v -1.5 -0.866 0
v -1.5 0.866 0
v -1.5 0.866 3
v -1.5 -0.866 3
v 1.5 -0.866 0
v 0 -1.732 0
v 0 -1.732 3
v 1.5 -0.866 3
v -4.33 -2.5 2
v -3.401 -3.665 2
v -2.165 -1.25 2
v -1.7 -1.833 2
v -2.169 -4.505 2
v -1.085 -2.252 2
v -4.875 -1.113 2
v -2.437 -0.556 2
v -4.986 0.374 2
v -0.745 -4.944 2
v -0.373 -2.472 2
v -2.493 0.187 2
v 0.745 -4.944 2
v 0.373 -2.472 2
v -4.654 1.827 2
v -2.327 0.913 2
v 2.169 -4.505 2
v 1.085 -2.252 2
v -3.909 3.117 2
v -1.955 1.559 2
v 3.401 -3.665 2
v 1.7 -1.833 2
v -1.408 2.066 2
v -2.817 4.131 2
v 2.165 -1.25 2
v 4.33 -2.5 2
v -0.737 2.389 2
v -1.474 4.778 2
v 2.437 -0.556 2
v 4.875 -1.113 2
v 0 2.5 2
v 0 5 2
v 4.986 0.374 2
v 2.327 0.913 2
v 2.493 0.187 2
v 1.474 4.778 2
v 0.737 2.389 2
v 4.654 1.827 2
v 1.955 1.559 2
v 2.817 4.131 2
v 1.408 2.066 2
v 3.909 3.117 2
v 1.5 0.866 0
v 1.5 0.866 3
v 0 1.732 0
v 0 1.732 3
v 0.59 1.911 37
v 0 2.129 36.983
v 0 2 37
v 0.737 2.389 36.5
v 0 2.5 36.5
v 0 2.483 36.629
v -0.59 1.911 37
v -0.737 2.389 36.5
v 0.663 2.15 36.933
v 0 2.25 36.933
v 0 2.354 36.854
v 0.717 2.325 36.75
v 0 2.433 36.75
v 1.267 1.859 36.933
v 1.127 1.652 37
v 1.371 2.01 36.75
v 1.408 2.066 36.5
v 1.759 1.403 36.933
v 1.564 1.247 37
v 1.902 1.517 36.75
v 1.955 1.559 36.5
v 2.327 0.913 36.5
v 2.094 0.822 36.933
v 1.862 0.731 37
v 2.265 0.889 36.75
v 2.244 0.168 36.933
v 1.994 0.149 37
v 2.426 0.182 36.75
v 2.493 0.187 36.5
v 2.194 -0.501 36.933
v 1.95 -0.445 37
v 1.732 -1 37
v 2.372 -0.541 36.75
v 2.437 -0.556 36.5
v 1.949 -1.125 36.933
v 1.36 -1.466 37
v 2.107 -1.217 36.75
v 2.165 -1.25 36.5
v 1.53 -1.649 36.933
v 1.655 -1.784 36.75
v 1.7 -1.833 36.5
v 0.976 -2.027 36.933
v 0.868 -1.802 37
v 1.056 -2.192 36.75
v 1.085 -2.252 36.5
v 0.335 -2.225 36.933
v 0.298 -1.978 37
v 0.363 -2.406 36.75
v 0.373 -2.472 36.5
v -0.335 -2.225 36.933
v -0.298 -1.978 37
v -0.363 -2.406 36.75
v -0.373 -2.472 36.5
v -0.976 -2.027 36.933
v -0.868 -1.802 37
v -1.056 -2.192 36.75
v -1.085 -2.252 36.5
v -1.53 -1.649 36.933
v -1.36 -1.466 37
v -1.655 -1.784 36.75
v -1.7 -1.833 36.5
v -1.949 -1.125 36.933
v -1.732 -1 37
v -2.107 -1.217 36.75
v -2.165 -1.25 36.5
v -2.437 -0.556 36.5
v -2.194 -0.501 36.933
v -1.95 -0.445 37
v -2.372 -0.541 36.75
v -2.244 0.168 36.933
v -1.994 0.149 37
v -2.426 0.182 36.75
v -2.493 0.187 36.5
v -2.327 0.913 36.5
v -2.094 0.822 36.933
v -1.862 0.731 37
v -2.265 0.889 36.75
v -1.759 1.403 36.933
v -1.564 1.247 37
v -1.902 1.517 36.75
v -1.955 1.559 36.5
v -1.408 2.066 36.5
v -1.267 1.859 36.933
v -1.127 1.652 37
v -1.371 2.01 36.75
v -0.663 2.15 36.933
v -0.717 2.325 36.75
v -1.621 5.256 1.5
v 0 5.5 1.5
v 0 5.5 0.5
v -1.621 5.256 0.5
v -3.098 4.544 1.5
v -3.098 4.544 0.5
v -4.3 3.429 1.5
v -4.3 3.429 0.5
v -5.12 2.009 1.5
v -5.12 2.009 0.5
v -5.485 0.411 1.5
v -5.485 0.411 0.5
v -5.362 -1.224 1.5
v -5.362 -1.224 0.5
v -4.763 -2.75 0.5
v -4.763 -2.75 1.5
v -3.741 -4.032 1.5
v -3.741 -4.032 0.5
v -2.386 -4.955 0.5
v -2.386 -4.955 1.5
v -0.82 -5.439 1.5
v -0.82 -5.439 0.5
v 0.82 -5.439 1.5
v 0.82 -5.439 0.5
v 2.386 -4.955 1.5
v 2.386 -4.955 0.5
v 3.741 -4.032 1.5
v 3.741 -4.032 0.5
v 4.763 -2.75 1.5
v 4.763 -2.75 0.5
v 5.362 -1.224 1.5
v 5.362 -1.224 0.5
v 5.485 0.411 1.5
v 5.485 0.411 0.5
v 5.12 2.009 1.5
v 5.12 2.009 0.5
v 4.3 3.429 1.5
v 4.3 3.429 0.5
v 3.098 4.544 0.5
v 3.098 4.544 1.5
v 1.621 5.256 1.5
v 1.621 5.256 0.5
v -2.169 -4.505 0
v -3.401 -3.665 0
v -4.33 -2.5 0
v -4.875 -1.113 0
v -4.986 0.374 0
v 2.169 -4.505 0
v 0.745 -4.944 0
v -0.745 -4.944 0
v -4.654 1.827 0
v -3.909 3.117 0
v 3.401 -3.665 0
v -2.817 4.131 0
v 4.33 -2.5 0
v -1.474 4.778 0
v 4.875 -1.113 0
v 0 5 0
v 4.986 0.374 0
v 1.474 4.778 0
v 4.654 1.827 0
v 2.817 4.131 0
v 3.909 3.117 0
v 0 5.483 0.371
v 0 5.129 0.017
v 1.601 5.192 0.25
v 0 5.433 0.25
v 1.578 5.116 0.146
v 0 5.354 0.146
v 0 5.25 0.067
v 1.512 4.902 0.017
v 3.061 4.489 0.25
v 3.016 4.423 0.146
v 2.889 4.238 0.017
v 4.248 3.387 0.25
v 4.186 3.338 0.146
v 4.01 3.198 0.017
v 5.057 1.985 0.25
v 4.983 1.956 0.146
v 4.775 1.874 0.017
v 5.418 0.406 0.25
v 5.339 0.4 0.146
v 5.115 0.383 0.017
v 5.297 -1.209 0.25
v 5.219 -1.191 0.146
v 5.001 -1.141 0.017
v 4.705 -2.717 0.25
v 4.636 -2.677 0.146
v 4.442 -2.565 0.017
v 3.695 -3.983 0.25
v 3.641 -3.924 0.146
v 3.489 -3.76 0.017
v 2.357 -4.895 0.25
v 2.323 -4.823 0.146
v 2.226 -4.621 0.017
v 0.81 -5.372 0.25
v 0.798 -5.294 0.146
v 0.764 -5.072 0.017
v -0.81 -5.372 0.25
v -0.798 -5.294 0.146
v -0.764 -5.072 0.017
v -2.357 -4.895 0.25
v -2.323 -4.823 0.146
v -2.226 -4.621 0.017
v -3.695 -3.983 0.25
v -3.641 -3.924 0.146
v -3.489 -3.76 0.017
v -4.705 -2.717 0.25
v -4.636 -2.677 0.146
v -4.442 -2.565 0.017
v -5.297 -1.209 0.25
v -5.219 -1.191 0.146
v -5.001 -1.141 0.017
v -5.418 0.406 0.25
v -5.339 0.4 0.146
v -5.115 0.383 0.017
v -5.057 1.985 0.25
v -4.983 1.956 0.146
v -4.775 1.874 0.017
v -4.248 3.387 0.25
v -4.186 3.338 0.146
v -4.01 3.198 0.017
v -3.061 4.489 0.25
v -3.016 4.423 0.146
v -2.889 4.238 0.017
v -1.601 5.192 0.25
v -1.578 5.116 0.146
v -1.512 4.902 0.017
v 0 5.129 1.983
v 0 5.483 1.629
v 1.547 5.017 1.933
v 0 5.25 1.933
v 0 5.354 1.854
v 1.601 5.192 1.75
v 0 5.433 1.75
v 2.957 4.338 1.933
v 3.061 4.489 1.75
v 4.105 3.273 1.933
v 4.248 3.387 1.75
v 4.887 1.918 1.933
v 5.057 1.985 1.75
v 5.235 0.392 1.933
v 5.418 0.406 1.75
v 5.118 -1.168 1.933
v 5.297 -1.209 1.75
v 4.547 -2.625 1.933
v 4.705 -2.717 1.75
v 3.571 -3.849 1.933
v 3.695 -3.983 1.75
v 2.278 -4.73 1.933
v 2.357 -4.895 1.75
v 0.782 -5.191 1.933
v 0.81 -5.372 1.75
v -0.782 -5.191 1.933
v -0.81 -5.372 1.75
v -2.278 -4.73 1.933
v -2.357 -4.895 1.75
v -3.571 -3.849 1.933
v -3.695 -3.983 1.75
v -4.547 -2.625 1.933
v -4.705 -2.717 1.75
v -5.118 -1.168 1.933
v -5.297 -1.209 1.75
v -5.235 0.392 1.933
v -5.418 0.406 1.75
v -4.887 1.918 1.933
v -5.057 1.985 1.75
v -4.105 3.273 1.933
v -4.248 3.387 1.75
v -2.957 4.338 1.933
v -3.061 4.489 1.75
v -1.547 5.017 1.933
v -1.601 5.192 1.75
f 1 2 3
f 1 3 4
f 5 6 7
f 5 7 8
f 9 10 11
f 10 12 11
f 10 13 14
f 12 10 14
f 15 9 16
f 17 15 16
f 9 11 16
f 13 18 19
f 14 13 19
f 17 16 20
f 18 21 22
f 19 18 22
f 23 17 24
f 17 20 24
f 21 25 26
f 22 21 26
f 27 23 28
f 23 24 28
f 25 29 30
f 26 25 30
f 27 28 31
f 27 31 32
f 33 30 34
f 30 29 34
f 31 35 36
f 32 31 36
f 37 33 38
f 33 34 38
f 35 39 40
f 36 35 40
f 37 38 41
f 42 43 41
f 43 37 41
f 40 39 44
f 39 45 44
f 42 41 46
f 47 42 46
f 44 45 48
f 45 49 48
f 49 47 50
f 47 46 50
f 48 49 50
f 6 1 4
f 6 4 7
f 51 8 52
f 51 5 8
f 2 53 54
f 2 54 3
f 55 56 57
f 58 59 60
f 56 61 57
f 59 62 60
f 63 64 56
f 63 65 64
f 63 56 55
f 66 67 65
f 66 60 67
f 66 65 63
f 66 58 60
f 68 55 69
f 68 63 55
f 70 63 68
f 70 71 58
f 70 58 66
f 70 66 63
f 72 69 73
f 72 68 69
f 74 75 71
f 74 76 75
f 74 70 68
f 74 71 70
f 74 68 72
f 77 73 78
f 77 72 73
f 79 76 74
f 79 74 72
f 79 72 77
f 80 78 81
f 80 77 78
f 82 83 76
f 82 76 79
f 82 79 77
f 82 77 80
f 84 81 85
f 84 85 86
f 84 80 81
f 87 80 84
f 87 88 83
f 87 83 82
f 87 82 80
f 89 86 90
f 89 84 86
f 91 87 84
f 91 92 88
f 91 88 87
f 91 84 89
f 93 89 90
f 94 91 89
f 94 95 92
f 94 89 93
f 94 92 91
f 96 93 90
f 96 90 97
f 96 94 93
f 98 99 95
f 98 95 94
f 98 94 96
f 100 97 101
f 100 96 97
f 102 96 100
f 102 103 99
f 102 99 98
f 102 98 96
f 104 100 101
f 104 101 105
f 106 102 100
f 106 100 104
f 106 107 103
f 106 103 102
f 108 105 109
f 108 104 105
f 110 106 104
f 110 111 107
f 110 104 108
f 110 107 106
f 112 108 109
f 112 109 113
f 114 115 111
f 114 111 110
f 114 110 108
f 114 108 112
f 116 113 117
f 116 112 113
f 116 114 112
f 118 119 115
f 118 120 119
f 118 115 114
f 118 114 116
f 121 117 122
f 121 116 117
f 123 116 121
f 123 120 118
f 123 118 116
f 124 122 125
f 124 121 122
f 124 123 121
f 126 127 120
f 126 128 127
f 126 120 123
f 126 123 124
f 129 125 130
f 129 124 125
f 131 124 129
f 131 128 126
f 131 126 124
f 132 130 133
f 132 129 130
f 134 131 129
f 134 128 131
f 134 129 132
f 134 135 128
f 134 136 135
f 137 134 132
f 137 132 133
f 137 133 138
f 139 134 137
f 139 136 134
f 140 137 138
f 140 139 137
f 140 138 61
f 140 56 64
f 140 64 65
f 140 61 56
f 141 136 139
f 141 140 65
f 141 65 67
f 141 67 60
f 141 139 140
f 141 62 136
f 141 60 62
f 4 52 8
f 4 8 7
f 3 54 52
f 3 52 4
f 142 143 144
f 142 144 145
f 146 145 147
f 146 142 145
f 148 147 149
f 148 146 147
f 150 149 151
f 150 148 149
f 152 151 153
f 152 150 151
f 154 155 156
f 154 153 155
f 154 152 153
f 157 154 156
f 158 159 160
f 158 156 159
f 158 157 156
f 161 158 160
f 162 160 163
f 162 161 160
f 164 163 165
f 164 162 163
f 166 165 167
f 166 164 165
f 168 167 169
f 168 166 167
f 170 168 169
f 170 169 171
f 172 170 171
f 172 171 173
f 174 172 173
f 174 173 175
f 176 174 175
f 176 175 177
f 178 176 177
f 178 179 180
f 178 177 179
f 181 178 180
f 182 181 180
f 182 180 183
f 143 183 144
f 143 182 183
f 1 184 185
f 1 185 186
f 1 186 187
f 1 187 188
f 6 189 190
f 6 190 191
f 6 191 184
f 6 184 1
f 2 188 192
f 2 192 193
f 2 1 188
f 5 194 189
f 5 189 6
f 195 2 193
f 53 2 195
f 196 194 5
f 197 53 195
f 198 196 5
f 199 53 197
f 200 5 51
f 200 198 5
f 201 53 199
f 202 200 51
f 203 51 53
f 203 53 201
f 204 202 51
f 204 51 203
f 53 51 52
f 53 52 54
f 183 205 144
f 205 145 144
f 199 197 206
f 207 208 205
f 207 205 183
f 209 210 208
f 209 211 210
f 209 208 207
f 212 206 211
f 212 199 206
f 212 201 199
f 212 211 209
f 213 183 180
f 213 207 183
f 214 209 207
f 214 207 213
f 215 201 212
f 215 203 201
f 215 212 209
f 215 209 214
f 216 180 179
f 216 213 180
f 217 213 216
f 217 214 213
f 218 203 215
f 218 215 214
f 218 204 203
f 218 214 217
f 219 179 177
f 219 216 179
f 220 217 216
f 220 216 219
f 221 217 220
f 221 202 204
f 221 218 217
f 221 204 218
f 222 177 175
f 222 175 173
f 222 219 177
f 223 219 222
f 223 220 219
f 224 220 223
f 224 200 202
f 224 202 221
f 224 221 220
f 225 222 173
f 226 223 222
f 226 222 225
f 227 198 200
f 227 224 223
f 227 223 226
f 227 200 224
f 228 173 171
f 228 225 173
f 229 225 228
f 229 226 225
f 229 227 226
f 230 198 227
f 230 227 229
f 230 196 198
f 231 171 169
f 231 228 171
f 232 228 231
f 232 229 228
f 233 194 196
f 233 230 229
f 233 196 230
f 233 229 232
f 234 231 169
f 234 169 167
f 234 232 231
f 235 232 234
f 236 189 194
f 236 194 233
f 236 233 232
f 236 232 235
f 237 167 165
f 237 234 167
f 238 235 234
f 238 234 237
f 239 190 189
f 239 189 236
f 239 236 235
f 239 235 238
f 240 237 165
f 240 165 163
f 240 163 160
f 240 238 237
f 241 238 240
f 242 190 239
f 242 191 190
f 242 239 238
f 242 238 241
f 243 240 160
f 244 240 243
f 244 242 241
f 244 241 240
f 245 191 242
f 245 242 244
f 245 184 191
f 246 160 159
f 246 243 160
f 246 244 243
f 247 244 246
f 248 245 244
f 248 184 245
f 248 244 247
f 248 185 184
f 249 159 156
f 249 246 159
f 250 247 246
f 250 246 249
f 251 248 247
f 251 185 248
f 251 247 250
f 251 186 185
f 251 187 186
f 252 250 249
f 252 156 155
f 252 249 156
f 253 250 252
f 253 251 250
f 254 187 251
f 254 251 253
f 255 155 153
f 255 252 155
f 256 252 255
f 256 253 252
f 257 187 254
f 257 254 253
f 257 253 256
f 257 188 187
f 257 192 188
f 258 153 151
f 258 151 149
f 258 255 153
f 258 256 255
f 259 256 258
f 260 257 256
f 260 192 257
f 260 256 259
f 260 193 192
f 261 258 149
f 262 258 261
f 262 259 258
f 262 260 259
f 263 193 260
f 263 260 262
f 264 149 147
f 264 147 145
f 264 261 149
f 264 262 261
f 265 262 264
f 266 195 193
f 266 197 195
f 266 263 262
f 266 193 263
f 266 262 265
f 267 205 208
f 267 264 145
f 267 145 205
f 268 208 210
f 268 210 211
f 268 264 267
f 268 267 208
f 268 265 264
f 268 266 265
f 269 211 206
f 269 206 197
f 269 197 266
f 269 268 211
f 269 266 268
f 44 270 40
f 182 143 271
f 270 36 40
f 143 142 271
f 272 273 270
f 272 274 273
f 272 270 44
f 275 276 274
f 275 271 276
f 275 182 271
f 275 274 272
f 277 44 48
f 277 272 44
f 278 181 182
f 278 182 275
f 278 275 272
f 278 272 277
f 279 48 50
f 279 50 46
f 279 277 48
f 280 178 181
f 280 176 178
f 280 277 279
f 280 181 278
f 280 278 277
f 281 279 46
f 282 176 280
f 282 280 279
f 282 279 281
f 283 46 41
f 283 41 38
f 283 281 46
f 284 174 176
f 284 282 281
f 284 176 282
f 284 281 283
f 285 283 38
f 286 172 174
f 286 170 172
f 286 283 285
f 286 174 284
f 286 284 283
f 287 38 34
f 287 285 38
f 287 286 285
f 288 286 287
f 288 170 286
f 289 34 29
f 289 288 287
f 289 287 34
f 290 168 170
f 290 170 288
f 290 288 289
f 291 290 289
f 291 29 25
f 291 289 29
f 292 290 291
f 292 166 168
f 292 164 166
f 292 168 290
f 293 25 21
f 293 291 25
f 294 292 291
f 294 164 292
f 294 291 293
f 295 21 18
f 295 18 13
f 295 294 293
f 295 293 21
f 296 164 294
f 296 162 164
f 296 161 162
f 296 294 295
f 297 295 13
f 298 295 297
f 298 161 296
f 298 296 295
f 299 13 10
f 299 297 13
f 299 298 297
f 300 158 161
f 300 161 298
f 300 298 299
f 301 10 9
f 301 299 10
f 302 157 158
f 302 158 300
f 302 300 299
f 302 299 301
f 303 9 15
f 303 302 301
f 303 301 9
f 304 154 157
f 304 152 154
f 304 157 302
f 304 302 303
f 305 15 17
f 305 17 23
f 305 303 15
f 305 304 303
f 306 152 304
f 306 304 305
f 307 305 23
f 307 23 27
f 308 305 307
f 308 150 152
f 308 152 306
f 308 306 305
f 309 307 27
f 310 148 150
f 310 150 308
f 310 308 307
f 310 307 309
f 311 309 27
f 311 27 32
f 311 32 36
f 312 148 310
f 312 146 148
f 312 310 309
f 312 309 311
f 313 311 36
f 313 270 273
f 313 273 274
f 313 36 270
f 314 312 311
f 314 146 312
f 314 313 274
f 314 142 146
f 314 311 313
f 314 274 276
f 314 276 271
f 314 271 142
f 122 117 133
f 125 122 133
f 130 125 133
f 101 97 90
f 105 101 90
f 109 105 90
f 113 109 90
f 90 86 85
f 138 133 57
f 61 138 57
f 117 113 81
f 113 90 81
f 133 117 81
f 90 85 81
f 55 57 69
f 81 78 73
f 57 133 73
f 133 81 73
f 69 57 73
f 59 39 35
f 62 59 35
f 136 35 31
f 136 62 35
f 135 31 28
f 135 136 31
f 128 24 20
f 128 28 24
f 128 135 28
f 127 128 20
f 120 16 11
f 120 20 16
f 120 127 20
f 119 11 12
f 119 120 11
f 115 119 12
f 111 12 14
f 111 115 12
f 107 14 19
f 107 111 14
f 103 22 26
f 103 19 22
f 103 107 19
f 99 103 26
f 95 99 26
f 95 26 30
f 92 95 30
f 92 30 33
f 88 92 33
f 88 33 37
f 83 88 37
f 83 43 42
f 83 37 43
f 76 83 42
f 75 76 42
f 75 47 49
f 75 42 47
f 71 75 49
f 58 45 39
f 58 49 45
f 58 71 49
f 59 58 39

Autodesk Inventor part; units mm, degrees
ref_plane "YZ Plane" through (0, 0, 0) normal (1, 0, 0) x (0, 1, 0)
ref_plane "XZ Plane" through (0, 0, 0) normal (0, 1, 0) x (-1, 0, 0)
ref_plane "XY Plane" through (0, 0, 0) normal (0, 0, 1) x (1, 0, 0)
sketch "Sketch1" plane through (0, 0, 0) normal (1, 0, 0) x (0, 1, 0)
  line L0 (0, 0) -> (5.5, 0)
  line L1 (5.5, 0) -> (5.5, 2)
  line L2 (5.5, 2) -> (2.5, 2)
  line L3 (2.5, 2) -> (2.5, 37)
  line L4 (2.5, 37) -> (0, 37)
  line L5 (0, 37) -> (0, 0)
  dimension "d0" = 35
  dimension "d1" = 2
  dimension "d2" = 5.5
  dimension "d3" = 2.5
revolve "Revolution1" add sketch "Sketch1" angle 360 about axis through (0, 0, 37) along (0, 0, -1)
fillet "Fillet1" radius 0.5 3 edges at (0, -5.5, 0) (0, -5.5, 2) (0, -2.5, 37)
sketch "Sketch2" plane through (0, 0, 0) normal (0, 0, -1) x (-1, 0, 0)
  circle A0 centre (0, 0) radius 5 projected
  line L0 (1.5, -0.866) -> (0, -1.7321)
  line L1 (0, -1.7321) -> (-1.5, -0.866)
  line L2 (-1.5, -0.866) -> (-1.5, 0.866)
  line L3 (-1.5, 0.866) -> (0, 1.7321)
  line L4 (0, 1.7321) -> (1.5, 0.866)
  line L5 (1.5, 0.866) -> (1.5, -0.866)
  dimension "d6" = 3
extrude "Extrusion1" cut sketch "Sketch2" against normal blind 3 contours L0 L1 L2 L3 L4 L5
thread "Thread1" size "M5x0.8" class "6g" standard "ANSI Metric M Profile" length 30 offset 3
properties part number "M5x35 low profile screw"
